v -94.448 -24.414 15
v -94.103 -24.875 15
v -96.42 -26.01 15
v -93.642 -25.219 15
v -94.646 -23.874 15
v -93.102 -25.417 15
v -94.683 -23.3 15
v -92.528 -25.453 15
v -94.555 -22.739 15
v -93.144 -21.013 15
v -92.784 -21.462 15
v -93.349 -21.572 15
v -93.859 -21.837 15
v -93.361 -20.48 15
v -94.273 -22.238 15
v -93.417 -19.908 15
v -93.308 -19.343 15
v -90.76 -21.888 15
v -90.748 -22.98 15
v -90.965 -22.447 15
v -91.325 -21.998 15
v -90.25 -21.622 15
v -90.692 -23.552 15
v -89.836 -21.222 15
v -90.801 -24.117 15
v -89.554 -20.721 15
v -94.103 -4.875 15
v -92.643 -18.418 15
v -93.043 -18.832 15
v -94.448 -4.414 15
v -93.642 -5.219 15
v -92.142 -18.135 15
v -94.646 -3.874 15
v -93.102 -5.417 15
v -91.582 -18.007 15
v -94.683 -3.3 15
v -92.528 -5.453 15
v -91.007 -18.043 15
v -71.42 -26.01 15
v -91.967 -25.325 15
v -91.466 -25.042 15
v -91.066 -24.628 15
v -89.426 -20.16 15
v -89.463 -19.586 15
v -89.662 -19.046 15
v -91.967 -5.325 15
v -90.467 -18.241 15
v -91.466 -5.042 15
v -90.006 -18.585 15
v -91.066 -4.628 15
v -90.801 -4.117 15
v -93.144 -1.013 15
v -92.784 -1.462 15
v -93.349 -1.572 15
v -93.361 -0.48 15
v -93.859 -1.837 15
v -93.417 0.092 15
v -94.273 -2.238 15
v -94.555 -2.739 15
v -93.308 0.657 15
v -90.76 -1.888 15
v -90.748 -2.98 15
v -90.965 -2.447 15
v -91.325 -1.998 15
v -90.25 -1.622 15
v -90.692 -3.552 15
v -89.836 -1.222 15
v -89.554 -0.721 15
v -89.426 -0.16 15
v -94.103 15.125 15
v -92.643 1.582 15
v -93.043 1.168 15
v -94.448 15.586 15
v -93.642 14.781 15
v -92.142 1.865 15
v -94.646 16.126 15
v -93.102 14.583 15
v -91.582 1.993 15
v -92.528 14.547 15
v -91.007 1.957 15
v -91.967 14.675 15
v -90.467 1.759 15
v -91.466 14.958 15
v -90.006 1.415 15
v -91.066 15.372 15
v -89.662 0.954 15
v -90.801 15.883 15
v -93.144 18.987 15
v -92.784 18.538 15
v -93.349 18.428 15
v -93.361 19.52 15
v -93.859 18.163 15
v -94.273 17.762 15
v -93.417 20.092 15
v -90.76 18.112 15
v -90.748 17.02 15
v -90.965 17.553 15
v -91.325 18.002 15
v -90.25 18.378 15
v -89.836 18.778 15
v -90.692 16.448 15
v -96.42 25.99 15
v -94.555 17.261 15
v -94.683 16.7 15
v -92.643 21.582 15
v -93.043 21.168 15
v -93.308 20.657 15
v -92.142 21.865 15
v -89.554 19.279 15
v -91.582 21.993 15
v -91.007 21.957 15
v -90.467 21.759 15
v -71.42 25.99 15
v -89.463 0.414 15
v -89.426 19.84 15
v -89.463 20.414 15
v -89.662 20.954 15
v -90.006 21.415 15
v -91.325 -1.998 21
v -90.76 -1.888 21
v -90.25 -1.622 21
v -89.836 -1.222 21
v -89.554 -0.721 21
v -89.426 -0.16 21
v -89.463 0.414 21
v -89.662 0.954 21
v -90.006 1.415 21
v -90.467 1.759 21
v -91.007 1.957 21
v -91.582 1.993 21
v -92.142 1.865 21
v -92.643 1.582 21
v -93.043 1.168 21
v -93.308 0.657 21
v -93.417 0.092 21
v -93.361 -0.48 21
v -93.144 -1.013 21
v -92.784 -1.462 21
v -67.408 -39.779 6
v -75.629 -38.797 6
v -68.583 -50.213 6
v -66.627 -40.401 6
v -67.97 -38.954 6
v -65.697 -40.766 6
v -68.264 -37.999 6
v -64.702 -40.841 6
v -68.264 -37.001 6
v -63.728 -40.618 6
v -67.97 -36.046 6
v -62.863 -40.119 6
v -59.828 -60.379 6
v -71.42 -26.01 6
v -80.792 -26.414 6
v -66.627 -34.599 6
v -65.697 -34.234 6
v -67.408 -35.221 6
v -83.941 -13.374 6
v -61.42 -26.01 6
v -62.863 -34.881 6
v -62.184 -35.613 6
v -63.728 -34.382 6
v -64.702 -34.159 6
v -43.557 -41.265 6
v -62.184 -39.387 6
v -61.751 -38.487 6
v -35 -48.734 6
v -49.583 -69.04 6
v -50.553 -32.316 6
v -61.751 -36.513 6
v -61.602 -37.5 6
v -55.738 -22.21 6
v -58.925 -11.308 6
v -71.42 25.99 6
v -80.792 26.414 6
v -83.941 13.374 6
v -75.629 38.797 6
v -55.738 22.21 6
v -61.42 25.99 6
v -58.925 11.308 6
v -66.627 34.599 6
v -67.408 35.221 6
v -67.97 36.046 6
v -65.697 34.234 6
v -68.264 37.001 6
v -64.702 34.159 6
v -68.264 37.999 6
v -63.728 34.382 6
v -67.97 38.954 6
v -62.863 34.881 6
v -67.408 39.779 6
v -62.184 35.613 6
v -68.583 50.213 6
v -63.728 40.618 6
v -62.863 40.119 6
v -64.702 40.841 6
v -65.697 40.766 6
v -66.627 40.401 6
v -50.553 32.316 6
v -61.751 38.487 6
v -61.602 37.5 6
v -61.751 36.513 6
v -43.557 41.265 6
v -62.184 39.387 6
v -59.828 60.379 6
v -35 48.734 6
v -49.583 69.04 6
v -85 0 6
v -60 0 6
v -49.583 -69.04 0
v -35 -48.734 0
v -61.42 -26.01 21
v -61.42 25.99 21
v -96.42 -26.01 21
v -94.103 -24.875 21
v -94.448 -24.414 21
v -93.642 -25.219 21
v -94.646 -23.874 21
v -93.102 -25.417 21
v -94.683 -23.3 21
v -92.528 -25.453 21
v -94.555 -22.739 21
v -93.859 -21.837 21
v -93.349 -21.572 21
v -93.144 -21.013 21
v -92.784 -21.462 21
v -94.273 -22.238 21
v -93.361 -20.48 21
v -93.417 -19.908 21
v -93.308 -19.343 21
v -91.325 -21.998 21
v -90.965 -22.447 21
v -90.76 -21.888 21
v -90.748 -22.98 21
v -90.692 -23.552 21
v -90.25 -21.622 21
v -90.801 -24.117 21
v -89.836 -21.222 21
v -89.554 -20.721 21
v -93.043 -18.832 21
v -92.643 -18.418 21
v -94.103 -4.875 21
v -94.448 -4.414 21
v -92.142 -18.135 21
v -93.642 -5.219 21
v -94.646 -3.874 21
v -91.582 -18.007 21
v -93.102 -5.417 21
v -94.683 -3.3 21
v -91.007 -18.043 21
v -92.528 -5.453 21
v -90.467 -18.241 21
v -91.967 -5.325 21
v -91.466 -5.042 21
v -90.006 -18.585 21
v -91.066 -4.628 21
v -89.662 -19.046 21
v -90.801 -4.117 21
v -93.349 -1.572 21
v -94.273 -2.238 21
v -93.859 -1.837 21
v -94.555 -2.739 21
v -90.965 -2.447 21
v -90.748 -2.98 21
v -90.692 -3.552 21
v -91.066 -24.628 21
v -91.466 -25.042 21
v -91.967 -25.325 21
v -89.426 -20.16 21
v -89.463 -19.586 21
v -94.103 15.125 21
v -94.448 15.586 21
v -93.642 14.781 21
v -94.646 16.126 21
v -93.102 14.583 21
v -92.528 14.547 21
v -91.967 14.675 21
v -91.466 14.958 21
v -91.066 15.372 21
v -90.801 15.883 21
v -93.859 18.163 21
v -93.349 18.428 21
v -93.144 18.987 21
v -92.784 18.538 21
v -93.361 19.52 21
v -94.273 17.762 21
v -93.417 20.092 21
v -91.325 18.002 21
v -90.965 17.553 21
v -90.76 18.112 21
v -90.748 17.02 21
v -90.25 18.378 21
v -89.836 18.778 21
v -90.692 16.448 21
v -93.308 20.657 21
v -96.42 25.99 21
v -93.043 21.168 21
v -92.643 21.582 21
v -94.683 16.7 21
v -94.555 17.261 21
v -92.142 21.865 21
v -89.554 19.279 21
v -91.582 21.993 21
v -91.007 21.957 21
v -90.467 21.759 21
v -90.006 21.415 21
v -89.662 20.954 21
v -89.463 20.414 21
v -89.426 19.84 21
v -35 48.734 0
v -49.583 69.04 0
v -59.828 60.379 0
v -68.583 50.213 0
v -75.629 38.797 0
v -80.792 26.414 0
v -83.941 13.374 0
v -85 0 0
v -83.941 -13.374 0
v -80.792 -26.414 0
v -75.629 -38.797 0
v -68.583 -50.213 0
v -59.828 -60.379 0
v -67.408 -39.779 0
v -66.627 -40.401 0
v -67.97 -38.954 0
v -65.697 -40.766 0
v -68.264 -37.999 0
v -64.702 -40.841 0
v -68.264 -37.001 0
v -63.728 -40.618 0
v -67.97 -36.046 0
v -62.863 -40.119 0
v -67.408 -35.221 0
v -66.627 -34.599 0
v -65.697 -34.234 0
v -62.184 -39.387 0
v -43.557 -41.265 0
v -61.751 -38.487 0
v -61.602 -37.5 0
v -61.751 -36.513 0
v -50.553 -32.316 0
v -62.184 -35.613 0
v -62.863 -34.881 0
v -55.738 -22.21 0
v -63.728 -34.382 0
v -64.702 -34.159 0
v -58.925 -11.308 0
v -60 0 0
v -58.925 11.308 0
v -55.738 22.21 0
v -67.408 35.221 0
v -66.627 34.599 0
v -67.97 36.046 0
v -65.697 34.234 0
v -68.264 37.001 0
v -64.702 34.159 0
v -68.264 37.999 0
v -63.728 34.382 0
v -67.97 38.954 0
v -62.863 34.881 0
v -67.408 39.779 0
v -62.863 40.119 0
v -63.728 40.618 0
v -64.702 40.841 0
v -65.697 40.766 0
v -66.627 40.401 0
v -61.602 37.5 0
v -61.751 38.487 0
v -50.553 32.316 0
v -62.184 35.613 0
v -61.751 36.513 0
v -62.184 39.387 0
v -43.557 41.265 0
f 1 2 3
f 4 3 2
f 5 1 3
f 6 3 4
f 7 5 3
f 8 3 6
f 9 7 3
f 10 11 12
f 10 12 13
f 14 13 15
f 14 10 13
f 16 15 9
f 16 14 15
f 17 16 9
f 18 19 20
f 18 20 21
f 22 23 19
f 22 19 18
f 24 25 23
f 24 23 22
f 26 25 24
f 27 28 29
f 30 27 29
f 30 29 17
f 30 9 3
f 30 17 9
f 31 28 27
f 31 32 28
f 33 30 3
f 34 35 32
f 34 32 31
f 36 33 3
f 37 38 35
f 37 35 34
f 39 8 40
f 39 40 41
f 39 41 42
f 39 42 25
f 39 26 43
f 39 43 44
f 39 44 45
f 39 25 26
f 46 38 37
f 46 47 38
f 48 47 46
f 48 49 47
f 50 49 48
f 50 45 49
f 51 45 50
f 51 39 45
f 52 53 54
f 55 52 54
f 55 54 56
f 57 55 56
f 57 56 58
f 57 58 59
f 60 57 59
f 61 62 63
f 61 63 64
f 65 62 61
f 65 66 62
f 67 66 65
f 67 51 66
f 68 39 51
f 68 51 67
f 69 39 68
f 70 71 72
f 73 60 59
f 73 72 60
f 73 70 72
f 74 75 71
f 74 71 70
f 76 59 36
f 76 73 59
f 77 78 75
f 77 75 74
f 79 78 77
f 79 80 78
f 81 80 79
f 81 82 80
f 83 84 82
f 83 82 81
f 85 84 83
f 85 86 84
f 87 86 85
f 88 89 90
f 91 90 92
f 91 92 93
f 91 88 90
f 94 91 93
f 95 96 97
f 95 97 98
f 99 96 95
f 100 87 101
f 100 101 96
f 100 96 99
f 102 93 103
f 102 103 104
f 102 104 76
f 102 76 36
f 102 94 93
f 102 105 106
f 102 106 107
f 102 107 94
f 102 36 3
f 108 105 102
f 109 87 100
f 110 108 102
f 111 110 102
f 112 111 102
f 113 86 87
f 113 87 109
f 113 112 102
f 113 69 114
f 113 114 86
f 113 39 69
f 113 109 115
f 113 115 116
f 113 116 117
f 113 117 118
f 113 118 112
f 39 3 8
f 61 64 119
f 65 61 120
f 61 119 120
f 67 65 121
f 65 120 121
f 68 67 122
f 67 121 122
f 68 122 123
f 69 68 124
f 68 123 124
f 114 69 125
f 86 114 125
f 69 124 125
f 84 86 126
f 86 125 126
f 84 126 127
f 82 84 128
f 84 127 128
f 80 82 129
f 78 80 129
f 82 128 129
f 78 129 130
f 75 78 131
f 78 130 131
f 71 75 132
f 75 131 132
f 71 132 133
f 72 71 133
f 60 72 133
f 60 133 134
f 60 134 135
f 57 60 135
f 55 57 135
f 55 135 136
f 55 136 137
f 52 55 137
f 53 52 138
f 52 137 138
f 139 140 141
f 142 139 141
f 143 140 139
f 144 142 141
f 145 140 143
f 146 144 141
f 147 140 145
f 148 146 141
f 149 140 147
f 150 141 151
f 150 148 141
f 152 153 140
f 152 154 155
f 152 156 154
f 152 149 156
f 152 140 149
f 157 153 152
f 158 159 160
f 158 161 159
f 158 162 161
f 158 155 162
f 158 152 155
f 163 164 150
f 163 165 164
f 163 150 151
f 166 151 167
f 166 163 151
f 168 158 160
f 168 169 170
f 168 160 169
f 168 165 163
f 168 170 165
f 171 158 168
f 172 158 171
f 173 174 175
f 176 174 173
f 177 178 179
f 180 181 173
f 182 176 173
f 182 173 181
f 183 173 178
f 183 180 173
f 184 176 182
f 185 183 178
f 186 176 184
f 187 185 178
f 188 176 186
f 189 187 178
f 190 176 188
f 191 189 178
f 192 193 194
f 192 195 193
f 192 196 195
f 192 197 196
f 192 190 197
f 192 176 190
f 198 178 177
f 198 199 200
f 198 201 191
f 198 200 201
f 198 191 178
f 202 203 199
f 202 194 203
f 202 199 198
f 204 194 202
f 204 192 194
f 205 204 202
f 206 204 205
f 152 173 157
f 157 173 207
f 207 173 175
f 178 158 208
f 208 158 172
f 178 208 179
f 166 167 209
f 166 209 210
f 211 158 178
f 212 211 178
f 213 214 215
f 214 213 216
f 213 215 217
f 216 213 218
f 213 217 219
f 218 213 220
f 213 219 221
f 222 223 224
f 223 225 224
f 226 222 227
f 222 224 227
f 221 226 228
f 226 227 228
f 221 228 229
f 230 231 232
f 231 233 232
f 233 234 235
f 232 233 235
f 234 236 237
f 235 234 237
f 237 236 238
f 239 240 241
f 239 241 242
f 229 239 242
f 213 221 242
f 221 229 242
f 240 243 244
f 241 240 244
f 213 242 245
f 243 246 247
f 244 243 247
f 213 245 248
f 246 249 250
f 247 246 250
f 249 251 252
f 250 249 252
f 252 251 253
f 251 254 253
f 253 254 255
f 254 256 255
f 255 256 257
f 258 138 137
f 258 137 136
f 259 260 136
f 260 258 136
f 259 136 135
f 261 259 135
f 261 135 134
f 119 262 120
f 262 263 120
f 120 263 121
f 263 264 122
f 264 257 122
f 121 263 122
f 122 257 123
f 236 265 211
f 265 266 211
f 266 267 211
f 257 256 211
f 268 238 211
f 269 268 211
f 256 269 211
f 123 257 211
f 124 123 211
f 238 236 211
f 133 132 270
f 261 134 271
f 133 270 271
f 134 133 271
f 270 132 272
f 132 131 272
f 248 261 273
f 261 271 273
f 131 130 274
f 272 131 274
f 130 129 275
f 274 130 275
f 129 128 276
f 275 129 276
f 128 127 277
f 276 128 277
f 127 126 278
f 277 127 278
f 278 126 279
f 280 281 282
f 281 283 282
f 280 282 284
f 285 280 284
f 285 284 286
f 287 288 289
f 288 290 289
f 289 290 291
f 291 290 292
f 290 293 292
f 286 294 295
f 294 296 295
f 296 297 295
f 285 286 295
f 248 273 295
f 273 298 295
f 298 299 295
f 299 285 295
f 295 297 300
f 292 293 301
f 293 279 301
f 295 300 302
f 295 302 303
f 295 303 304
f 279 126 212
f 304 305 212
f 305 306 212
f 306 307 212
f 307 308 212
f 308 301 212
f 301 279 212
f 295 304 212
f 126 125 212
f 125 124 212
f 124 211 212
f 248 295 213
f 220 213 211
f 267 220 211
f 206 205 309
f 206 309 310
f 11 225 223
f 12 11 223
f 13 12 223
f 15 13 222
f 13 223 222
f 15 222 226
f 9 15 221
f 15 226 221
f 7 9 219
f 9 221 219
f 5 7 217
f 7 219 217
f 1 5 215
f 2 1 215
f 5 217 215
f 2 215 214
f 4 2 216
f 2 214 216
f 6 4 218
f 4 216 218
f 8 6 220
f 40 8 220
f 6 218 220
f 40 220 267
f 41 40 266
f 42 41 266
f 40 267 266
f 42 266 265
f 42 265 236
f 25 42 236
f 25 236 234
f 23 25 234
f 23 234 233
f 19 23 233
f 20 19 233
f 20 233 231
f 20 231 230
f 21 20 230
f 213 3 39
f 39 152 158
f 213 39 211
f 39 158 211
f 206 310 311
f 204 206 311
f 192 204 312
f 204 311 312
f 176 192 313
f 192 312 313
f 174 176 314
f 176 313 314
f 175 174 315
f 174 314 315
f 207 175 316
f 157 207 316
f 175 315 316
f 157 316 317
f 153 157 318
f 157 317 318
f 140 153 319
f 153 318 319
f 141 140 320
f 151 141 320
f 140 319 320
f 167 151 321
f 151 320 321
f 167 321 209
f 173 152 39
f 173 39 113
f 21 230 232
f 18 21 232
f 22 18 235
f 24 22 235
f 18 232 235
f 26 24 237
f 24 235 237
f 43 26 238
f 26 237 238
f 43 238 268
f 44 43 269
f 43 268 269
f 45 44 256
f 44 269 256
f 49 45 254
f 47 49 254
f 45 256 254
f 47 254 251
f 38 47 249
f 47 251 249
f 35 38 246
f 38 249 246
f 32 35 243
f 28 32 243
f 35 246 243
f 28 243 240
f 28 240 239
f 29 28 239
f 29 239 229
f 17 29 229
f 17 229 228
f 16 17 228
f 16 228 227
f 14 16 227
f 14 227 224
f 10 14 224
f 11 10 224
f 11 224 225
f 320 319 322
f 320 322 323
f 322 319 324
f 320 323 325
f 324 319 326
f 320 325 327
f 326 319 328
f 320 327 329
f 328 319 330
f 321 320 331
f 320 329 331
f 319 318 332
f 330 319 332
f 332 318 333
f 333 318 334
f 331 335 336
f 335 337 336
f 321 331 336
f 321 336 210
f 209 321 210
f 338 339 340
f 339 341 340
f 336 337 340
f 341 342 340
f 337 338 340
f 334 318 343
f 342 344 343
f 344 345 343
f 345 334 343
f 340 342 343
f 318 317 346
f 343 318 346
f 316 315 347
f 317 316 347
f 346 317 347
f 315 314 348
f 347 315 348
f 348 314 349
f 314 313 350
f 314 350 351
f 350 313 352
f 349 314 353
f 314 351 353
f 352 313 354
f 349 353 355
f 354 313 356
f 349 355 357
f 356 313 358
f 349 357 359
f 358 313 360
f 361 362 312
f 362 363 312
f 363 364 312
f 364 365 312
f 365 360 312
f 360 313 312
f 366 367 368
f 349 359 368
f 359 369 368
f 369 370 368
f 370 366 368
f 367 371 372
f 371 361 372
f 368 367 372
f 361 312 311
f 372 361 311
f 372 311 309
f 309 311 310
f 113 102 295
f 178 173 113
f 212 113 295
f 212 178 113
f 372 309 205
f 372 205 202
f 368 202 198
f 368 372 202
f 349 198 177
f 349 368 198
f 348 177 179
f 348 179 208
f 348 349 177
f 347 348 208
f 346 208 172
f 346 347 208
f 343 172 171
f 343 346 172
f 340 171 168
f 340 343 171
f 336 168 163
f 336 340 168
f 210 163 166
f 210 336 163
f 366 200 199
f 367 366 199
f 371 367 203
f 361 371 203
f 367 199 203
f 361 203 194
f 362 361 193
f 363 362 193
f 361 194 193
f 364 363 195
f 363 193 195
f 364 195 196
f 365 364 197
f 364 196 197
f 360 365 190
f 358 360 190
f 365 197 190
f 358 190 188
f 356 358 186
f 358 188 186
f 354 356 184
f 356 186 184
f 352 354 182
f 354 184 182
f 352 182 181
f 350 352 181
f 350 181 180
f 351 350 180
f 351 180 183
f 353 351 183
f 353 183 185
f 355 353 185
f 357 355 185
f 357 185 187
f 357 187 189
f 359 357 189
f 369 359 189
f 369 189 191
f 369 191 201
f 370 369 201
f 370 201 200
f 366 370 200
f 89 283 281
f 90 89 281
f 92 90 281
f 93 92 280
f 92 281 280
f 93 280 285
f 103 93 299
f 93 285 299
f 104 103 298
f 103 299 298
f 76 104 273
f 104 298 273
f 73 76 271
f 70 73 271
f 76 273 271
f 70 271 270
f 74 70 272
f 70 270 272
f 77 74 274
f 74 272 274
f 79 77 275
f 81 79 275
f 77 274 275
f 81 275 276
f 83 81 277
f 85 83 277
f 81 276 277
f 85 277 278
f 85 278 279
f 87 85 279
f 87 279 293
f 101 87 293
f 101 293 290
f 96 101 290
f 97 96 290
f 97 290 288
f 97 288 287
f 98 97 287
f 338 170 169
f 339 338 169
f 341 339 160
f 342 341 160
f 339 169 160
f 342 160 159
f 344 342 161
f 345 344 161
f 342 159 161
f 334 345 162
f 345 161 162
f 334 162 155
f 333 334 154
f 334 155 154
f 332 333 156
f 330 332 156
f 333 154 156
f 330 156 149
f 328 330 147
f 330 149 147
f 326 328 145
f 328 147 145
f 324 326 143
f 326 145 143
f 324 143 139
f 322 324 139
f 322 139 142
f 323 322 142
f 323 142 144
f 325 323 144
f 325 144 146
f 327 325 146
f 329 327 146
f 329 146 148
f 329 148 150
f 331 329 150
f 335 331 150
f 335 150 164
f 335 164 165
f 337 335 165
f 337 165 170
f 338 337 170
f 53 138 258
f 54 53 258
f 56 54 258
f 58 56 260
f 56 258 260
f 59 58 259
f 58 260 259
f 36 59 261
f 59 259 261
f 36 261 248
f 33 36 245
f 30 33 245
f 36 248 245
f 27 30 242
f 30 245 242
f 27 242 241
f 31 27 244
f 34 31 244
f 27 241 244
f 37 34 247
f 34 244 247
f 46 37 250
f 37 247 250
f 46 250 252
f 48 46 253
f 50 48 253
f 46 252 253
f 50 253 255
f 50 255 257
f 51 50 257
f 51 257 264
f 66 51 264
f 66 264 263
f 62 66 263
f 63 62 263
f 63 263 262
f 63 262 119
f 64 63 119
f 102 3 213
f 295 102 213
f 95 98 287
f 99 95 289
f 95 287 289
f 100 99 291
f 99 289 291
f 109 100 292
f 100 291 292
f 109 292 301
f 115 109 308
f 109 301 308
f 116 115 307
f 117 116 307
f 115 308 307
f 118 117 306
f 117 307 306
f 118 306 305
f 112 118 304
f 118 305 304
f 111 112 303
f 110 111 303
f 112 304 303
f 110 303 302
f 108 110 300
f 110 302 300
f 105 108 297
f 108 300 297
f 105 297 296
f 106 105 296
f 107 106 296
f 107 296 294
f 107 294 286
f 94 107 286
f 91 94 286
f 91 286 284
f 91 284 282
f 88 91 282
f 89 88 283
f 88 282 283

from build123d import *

# Parameters (mm, degrees)
SKETCH_1_R          = 85
SKETCH_1_R_2        = 60
EXTRUDE_1_DEPTH     = 6
SKETCH_2_R          = 3.35
CUT_EXTRUDE_1_DEPTH = 10
SKETCH_3_W          = 10
SKETCH_3_H          = 52
EXTRUDE_2_DEPTH     = 15
SKETCH_8_W          = 6
SKETCH_8_H          = 52
EXTRUDE_3_DEPTH     = 25
SKETCH_10_W         = 8.003334919
SKETCH_10_H         = 52
EXTRUDE_4_DEPTH     = 25
SKETCH_11_R         = 2
CUT_EXTRUDE_3_DEPTH = 25
CUT_EXTRUDE_4_DEPTH = 50
SKETCH_6_R          = 2
CUT_EXTRUDE_2_DEPTH = 20


with BuildPart() as part:
    # 草图1 → 凸台-拉伸1 (new body)
    with BuildSketch(Plane.XY):
        Circle(SKETCH_1_R)
        Circle(SKETCH_1_R_2, mode=Mode.SUBTRACT)
    extrude(amount=EXTRUDE_1_DEPTH)

    # 草图2 → 切除-拉伸1 (cut)
    with BuildSketch(Plane.XY.offset(6)):
        with Locations((0, 75)):
            Circle(SKETCH_2_R)
        with Locations((64.951905284, 37.5)):
            Circle(SKETCH_2_R)
        with Locations((64.951905284, -37.5)):
            Circle(SKETCH_2_R)
        with Locations((0, -75)):
            Circle(SKETCH_2_R)
        with Locations((-64.951905284, -37.5)):
            Circle(SKETCH_2_R)
        with Locations((-64.951905284, 37.5)):
            Circle(SKETCH_2_R)
    extrude(amount=-CUT_EXTRUDE_1_DEPTH, mode=Mode.SUBTRACT)

    # 草图3 → 凸台-拉伸2 (add)
    with BuildSketch(Plane.XY.offset(6)):
        with Locations((66.419532829, -0.009729533)):
            Rectangle(SKETCH_3_W, SKETCH_3_H)
        with Locations((-66.419532829, -0.009729533)):
            Rectangle(SKETCH_3_W, SKETCH_3_H)
    extrude(amount=EXTRUDE_2_DEPTH)

    # 草图8 → 凸台-拉伸3 (add)
    with BuildSketch(Plane.ZY.offset(71.419532829)):
        with Locations((18, -0.009729533)):
            Rectangle(SKETCH_8_W, SKETCH_8_H)
    extrude(amount=EXTRUDE_3_DEPTH)

    # 草图10 → 凸台-拉伸4 (add)
    with BuildSketch(Plane(origin=(71.419532829, 0, 0), x_dir=(0, 0, -1), z_dir=(1, 0, 0))):
        with Locations((-16.998332541, -0.009729533)):
            Rectangle(SKETCH_10_W, SKETCH_10_H)
    extrude(amount=EXTRUDE_4_DEPTH)

    # 草图11 → 切除-拉伸3 (cut)
    with BuildSketch(Plane.XY.offset(21)):
        with Locations((-91.419532829, 0)):
            Circle(SKETCH_11_R)
        with Locations((-91.419532829, 20)):
            Circle(SKETCH_11_R)
        with Locations(Location((91.419532829, 0, 0), (0, 0, 270))):
            Circle(SKETCH_11_R)
        with Locations(Location((91.419532829, 20, 0), (0, 0, 270))):
            Circle(SKETCH_11_R)
        with Locations((91.419532829, -20)):
            Circle(SKETCH_11_R)
        with Locations(Location((-91.419532829, -20, 0), (0, 0, 270))):
            Circle(SKETCH_11_R)
    extrude(amount=-CUT_EXTRUDE_3_DEPTH, mode=Mode.SUBTRACT)

    # 草图12 → 切除-拉伸4 (cut, symmetric)
    with BuildSketch(Plane.XY.offset(6)):
        with BuildLine():
            Line((-35, 48.733971724), (-49.583333333, 69.039793276))
            ThreePointArc((-49.583333333, 69.039793276), (-42.500689847, 73.611761034), (-35, 77.459666924))
            Line((-35, 77.459666924), (-35, 90))
            Line((-35, 90), (35, 90))
            Line((35, 90), (153.524849436, 90))
            Line((153.524849436, 90), (153.524849436, -90))
            Line((153.524849436, -90), (35, -90))
            Line((35, -90), (-35, -90))
            Line((-35, -90), (-35, -77.459666924))
            ThreePointArc((-35, -77.459666924), (-42.500689847, -73.611761034), (-49.583333333, -69.039793276))
            Line((-49.583333333, -69.039793276), (-35, -48.733971724))
            Line((-35, -48.733971724), (-35, 48.733971724))
        make_face()
    extrude(amount=CUT_EXTRUDE_4_DEPTH, both=True, mode=Mode.SUBTRACT)

    # 草图6 → 切除-拉伸2 (cut)
    with BuildSketch(Plane.XY.offset(26)):
        with Locations((92.689735177, -3.459773101)):
            Circle(SKETCH_6_R)
        with Locations((92.689735177, -23.459773101)):
            Circle(SKETCH_6_R)
        with Locations((92.689735177, 16.540226899)):
            Circle(SKETCH_6_R)
        with Locations((-92.689735177, -23.459773101)):
            Circle(SKETCH_6_R)
        with Locations((-92.689735177, -3.459773101)):
            Circle(SKETCH_6_R)
        with Locations((-92.689735177, 16.540226899)):
            Circle(SKETCH_6_R)
    extrude(amount=-CUT_EXTRUDE_2_DEPTH, mode=Mode.SUBTRACT)


solid = part.part
